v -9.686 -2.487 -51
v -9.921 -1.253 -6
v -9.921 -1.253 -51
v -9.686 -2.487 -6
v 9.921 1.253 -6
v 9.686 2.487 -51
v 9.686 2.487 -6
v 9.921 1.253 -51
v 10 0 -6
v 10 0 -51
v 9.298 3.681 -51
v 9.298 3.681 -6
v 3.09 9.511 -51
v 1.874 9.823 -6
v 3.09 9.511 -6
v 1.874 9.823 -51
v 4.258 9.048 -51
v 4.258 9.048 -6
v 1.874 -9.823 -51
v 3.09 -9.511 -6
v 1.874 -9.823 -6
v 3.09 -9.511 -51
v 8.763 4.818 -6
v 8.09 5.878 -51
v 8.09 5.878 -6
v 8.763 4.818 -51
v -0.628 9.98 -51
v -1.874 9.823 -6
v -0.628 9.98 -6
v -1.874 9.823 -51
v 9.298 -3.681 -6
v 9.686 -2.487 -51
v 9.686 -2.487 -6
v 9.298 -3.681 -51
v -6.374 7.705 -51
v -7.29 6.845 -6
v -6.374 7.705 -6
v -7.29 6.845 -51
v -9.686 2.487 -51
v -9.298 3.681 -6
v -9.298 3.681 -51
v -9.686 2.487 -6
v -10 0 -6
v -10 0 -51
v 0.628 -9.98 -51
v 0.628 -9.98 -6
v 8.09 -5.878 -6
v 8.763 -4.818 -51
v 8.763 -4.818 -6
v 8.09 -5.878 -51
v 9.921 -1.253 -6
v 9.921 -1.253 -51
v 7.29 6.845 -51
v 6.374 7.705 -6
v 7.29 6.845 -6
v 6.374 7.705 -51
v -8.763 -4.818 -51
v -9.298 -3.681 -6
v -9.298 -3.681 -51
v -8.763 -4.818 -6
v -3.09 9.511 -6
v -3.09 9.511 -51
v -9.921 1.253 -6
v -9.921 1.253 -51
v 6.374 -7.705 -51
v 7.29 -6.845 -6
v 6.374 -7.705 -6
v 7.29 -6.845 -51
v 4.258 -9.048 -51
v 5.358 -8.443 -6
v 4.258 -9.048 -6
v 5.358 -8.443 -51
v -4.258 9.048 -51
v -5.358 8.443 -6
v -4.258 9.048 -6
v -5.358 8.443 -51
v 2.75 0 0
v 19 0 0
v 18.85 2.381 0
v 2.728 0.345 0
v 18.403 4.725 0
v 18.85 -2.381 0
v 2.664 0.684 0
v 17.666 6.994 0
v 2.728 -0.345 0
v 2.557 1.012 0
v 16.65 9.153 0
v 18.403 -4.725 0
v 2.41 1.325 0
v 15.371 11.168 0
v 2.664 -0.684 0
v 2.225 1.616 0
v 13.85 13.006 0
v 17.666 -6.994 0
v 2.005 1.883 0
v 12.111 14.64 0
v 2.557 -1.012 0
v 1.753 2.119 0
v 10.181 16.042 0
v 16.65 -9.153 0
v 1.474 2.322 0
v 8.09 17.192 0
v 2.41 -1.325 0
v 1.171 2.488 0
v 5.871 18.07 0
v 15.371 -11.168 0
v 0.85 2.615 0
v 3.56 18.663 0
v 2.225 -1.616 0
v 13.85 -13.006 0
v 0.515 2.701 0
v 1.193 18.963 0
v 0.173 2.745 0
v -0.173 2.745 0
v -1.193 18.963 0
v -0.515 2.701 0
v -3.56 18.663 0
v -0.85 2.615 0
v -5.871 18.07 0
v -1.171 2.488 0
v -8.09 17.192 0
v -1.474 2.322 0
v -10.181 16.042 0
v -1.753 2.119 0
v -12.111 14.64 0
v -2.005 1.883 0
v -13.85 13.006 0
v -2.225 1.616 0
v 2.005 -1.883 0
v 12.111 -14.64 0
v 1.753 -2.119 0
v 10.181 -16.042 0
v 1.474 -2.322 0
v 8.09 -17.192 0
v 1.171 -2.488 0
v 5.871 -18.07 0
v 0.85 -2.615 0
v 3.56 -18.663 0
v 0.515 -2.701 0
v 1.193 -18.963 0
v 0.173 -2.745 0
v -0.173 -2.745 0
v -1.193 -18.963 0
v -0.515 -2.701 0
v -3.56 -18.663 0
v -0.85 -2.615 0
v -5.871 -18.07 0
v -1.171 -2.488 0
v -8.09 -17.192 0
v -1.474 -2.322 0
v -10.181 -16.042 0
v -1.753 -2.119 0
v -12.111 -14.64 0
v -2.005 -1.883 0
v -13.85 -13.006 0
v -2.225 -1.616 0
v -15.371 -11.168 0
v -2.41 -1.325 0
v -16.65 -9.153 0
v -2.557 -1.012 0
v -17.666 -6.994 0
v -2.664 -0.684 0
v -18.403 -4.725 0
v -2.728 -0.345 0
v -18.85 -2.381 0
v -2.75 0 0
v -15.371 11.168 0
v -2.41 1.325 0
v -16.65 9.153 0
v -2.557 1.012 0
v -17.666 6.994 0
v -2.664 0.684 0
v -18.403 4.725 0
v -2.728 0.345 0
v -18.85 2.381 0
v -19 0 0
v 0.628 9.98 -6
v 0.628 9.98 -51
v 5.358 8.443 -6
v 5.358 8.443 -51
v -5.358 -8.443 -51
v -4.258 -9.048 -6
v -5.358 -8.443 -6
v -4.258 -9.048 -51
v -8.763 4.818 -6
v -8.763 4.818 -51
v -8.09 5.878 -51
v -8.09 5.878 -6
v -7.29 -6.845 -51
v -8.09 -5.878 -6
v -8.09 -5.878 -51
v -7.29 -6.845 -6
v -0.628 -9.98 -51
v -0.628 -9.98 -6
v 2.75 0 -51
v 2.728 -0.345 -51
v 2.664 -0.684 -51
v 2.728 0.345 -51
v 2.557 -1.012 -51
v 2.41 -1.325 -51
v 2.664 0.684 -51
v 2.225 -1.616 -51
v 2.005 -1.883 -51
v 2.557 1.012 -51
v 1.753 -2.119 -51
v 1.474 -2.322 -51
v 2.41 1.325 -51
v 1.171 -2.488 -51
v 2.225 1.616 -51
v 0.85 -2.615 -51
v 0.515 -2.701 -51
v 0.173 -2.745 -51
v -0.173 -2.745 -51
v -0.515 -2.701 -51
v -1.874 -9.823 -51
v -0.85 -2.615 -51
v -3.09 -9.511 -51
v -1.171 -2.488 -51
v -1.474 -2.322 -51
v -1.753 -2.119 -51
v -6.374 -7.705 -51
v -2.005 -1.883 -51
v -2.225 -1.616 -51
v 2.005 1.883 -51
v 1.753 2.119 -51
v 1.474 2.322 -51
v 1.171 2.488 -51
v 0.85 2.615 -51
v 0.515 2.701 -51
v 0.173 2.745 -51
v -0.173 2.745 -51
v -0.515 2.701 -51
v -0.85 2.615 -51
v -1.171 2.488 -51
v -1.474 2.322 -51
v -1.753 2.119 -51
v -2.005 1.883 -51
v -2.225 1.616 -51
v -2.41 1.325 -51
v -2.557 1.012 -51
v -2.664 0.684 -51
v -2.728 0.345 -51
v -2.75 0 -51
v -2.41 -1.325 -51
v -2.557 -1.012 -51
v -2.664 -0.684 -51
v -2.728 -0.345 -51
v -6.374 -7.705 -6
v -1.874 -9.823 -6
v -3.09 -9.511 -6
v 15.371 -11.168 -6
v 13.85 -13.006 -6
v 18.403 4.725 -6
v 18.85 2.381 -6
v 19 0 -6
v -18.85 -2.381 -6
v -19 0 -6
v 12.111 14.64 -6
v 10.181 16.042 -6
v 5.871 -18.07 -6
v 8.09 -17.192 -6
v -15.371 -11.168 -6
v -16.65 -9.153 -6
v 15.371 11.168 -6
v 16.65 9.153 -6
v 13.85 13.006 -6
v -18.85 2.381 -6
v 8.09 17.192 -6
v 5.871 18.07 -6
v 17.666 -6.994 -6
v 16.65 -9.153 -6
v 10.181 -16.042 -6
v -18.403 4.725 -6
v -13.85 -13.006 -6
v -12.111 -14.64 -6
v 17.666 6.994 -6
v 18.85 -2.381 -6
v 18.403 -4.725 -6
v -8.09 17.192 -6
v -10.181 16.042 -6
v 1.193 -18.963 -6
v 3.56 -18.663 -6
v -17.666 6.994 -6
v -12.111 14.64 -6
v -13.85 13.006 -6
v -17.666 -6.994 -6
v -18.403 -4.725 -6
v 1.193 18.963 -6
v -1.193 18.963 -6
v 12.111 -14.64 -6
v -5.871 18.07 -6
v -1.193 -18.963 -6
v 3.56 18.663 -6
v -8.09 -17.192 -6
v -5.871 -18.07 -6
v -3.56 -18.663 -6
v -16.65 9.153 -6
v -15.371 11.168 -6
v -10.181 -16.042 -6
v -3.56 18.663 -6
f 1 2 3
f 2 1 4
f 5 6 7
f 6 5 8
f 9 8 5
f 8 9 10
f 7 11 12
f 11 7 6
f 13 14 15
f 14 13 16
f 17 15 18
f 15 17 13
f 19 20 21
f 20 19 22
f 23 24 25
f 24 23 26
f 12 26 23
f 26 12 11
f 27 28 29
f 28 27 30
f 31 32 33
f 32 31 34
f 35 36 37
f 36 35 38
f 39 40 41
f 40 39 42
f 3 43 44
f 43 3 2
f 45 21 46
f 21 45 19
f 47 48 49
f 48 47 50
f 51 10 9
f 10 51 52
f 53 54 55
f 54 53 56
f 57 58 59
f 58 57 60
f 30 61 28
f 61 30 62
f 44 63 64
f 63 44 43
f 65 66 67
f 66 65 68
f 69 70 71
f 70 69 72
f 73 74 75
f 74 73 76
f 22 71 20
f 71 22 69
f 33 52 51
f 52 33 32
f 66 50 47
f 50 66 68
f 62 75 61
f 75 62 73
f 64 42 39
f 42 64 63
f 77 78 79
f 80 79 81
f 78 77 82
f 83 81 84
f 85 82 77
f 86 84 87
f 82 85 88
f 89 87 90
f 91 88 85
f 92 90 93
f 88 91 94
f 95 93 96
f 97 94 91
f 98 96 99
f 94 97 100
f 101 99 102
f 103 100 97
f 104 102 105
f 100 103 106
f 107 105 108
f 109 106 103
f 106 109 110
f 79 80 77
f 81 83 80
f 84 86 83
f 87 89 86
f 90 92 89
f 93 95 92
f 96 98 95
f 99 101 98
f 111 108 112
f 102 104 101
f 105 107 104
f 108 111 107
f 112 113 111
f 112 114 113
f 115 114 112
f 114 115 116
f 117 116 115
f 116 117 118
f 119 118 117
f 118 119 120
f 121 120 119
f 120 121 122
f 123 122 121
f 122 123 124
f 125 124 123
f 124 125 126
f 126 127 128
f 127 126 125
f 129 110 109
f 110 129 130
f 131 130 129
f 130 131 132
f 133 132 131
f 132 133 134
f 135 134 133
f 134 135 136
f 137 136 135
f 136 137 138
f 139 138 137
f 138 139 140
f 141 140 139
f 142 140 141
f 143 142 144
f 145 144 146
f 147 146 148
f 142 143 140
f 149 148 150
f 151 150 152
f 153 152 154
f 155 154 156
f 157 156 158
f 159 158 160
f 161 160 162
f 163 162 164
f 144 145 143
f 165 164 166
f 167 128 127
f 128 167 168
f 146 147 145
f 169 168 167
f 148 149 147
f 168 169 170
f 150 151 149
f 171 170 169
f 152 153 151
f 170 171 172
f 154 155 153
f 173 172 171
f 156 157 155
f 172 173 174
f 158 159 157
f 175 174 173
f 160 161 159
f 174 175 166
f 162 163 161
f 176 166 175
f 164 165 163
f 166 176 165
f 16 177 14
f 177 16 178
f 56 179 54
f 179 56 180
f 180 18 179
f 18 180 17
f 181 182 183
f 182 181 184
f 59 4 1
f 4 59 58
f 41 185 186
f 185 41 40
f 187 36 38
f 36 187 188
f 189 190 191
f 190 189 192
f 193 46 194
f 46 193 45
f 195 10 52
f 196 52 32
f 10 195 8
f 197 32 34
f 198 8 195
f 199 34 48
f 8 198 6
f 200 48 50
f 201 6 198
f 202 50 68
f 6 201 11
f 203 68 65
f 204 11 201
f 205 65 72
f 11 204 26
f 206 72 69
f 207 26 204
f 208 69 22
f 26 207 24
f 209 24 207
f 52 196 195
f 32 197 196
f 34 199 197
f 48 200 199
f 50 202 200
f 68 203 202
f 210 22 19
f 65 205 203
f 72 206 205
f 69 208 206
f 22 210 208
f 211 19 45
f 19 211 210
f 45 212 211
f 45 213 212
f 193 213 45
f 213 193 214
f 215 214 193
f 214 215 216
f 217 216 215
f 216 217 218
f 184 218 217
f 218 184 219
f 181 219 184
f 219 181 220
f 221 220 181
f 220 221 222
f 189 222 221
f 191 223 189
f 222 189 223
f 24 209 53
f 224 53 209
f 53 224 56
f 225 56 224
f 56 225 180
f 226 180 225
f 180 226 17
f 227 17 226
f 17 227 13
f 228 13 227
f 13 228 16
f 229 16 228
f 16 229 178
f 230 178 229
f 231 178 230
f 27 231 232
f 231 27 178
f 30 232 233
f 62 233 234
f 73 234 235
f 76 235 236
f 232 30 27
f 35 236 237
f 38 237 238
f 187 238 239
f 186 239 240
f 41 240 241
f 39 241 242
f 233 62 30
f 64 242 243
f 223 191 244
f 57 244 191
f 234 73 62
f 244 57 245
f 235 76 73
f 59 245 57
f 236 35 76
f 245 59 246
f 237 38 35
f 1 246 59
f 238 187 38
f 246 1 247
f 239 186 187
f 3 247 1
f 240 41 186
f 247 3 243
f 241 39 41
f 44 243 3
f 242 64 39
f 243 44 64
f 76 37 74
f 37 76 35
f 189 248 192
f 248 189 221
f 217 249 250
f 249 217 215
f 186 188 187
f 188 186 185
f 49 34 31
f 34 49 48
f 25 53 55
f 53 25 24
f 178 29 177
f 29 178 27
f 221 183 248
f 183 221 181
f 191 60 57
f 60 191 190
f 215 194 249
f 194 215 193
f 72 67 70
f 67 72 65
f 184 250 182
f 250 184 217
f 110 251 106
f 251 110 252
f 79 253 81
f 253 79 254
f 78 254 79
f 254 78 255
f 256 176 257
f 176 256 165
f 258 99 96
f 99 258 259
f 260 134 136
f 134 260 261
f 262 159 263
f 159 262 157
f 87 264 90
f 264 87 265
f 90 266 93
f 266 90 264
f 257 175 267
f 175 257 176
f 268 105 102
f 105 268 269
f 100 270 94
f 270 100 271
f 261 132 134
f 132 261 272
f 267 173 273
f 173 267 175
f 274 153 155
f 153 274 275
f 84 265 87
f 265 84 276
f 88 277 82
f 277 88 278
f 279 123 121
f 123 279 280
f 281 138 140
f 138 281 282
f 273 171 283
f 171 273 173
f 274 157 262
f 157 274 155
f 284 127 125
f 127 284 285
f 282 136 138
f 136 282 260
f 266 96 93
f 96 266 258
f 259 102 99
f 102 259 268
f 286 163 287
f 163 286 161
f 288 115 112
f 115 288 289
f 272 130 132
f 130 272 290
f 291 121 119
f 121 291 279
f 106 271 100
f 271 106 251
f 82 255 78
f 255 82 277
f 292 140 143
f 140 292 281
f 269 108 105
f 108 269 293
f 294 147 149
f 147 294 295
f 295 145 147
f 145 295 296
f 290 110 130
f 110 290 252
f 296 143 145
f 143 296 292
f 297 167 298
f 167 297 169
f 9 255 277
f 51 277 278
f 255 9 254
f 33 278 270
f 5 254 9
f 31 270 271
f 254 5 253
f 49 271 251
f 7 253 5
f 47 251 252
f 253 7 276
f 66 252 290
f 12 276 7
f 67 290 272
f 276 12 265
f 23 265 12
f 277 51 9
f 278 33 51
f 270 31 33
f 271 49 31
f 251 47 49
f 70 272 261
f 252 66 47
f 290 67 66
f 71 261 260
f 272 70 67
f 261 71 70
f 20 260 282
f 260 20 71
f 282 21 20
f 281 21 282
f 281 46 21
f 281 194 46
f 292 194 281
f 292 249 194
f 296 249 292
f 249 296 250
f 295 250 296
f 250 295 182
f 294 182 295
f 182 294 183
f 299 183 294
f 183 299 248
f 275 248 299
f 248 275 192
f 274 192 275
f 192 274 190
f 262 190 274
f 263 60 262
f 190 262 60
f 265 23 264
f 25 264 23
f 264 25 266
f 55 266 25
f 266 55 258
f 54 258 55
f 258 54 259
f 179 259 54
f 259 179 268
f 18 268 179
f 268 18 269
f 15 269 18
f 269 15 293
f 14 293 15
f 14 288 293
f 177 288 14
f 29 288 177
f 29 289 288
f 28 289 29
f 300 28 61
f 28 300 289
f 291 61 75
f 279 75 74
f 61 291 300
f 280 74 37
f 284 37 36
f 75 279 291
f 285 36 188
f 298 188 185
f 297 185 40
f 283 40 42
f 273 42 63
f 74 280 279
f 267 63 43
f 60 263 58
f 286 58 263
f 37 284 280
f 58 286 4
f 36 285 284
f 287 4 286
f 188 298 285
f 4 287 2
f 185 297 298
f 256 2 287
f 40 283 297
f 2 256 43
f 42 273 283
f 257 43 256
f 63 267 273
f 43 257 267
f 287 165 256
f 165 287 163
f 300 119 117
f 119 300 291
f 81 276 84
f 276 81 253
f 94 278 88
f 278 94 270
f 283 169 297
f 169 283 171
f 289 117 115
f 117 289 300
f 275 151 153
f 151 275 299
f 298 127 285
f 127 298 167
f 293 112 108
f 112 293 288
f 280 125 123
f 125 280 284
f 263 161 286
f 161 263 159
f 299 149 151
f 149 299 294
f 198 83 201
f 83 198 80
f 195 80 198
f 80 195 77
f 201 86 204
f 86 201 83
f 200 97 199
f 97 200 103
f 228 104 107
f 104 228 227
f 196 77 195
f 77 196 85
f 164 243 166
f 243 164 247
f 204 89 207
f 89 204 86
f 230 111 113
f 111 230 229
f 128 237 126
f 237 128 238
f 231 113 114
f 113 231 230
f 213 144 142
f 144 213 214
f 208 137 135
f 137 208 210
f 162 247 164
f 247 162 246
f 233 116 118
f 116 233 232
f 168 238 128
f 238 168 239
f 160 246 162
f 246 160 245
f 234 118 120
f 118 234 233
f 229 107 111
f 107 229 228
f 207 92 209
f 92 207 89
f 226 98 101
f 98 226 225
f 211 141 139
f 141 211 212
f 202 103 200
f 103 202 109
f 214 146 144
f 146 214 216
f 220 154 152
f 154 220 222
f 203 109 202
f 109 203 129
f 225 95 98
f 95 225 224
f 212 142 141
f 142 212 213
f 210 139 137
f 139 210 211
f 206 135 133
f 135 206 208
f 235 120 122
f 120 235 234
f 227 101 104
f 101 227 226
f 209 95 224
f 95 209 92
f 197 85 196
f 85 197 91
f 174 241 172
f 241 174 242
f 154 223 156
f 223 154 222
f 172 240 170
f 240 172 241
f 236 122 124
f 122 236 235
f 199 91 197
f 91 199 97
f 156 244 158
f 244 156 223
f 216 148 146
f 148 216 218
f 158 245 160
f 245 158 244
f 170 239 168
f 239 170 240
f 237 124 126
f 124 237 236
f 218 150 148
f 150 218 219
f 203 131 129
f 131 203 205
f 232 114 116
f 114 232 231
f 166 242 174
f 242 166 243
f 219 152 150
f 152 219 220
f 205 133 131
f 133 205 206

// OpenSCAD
$fn = 50;


difference() {
	union() {
		translate(v = [0, 0, -51.0000000000]) {
			cylinder(h = 51, r = 10.0000000000);
		}
		translate(v = [0, 0, -6.0000000000]) {
			cylinder(h = 6, r = 19.0000000000);
		}
	}
	union() {
		#translate(v = [0, 0, -51]) {
			cylinder(h = 51, r = 2.7500000000);
		}
	}
}
